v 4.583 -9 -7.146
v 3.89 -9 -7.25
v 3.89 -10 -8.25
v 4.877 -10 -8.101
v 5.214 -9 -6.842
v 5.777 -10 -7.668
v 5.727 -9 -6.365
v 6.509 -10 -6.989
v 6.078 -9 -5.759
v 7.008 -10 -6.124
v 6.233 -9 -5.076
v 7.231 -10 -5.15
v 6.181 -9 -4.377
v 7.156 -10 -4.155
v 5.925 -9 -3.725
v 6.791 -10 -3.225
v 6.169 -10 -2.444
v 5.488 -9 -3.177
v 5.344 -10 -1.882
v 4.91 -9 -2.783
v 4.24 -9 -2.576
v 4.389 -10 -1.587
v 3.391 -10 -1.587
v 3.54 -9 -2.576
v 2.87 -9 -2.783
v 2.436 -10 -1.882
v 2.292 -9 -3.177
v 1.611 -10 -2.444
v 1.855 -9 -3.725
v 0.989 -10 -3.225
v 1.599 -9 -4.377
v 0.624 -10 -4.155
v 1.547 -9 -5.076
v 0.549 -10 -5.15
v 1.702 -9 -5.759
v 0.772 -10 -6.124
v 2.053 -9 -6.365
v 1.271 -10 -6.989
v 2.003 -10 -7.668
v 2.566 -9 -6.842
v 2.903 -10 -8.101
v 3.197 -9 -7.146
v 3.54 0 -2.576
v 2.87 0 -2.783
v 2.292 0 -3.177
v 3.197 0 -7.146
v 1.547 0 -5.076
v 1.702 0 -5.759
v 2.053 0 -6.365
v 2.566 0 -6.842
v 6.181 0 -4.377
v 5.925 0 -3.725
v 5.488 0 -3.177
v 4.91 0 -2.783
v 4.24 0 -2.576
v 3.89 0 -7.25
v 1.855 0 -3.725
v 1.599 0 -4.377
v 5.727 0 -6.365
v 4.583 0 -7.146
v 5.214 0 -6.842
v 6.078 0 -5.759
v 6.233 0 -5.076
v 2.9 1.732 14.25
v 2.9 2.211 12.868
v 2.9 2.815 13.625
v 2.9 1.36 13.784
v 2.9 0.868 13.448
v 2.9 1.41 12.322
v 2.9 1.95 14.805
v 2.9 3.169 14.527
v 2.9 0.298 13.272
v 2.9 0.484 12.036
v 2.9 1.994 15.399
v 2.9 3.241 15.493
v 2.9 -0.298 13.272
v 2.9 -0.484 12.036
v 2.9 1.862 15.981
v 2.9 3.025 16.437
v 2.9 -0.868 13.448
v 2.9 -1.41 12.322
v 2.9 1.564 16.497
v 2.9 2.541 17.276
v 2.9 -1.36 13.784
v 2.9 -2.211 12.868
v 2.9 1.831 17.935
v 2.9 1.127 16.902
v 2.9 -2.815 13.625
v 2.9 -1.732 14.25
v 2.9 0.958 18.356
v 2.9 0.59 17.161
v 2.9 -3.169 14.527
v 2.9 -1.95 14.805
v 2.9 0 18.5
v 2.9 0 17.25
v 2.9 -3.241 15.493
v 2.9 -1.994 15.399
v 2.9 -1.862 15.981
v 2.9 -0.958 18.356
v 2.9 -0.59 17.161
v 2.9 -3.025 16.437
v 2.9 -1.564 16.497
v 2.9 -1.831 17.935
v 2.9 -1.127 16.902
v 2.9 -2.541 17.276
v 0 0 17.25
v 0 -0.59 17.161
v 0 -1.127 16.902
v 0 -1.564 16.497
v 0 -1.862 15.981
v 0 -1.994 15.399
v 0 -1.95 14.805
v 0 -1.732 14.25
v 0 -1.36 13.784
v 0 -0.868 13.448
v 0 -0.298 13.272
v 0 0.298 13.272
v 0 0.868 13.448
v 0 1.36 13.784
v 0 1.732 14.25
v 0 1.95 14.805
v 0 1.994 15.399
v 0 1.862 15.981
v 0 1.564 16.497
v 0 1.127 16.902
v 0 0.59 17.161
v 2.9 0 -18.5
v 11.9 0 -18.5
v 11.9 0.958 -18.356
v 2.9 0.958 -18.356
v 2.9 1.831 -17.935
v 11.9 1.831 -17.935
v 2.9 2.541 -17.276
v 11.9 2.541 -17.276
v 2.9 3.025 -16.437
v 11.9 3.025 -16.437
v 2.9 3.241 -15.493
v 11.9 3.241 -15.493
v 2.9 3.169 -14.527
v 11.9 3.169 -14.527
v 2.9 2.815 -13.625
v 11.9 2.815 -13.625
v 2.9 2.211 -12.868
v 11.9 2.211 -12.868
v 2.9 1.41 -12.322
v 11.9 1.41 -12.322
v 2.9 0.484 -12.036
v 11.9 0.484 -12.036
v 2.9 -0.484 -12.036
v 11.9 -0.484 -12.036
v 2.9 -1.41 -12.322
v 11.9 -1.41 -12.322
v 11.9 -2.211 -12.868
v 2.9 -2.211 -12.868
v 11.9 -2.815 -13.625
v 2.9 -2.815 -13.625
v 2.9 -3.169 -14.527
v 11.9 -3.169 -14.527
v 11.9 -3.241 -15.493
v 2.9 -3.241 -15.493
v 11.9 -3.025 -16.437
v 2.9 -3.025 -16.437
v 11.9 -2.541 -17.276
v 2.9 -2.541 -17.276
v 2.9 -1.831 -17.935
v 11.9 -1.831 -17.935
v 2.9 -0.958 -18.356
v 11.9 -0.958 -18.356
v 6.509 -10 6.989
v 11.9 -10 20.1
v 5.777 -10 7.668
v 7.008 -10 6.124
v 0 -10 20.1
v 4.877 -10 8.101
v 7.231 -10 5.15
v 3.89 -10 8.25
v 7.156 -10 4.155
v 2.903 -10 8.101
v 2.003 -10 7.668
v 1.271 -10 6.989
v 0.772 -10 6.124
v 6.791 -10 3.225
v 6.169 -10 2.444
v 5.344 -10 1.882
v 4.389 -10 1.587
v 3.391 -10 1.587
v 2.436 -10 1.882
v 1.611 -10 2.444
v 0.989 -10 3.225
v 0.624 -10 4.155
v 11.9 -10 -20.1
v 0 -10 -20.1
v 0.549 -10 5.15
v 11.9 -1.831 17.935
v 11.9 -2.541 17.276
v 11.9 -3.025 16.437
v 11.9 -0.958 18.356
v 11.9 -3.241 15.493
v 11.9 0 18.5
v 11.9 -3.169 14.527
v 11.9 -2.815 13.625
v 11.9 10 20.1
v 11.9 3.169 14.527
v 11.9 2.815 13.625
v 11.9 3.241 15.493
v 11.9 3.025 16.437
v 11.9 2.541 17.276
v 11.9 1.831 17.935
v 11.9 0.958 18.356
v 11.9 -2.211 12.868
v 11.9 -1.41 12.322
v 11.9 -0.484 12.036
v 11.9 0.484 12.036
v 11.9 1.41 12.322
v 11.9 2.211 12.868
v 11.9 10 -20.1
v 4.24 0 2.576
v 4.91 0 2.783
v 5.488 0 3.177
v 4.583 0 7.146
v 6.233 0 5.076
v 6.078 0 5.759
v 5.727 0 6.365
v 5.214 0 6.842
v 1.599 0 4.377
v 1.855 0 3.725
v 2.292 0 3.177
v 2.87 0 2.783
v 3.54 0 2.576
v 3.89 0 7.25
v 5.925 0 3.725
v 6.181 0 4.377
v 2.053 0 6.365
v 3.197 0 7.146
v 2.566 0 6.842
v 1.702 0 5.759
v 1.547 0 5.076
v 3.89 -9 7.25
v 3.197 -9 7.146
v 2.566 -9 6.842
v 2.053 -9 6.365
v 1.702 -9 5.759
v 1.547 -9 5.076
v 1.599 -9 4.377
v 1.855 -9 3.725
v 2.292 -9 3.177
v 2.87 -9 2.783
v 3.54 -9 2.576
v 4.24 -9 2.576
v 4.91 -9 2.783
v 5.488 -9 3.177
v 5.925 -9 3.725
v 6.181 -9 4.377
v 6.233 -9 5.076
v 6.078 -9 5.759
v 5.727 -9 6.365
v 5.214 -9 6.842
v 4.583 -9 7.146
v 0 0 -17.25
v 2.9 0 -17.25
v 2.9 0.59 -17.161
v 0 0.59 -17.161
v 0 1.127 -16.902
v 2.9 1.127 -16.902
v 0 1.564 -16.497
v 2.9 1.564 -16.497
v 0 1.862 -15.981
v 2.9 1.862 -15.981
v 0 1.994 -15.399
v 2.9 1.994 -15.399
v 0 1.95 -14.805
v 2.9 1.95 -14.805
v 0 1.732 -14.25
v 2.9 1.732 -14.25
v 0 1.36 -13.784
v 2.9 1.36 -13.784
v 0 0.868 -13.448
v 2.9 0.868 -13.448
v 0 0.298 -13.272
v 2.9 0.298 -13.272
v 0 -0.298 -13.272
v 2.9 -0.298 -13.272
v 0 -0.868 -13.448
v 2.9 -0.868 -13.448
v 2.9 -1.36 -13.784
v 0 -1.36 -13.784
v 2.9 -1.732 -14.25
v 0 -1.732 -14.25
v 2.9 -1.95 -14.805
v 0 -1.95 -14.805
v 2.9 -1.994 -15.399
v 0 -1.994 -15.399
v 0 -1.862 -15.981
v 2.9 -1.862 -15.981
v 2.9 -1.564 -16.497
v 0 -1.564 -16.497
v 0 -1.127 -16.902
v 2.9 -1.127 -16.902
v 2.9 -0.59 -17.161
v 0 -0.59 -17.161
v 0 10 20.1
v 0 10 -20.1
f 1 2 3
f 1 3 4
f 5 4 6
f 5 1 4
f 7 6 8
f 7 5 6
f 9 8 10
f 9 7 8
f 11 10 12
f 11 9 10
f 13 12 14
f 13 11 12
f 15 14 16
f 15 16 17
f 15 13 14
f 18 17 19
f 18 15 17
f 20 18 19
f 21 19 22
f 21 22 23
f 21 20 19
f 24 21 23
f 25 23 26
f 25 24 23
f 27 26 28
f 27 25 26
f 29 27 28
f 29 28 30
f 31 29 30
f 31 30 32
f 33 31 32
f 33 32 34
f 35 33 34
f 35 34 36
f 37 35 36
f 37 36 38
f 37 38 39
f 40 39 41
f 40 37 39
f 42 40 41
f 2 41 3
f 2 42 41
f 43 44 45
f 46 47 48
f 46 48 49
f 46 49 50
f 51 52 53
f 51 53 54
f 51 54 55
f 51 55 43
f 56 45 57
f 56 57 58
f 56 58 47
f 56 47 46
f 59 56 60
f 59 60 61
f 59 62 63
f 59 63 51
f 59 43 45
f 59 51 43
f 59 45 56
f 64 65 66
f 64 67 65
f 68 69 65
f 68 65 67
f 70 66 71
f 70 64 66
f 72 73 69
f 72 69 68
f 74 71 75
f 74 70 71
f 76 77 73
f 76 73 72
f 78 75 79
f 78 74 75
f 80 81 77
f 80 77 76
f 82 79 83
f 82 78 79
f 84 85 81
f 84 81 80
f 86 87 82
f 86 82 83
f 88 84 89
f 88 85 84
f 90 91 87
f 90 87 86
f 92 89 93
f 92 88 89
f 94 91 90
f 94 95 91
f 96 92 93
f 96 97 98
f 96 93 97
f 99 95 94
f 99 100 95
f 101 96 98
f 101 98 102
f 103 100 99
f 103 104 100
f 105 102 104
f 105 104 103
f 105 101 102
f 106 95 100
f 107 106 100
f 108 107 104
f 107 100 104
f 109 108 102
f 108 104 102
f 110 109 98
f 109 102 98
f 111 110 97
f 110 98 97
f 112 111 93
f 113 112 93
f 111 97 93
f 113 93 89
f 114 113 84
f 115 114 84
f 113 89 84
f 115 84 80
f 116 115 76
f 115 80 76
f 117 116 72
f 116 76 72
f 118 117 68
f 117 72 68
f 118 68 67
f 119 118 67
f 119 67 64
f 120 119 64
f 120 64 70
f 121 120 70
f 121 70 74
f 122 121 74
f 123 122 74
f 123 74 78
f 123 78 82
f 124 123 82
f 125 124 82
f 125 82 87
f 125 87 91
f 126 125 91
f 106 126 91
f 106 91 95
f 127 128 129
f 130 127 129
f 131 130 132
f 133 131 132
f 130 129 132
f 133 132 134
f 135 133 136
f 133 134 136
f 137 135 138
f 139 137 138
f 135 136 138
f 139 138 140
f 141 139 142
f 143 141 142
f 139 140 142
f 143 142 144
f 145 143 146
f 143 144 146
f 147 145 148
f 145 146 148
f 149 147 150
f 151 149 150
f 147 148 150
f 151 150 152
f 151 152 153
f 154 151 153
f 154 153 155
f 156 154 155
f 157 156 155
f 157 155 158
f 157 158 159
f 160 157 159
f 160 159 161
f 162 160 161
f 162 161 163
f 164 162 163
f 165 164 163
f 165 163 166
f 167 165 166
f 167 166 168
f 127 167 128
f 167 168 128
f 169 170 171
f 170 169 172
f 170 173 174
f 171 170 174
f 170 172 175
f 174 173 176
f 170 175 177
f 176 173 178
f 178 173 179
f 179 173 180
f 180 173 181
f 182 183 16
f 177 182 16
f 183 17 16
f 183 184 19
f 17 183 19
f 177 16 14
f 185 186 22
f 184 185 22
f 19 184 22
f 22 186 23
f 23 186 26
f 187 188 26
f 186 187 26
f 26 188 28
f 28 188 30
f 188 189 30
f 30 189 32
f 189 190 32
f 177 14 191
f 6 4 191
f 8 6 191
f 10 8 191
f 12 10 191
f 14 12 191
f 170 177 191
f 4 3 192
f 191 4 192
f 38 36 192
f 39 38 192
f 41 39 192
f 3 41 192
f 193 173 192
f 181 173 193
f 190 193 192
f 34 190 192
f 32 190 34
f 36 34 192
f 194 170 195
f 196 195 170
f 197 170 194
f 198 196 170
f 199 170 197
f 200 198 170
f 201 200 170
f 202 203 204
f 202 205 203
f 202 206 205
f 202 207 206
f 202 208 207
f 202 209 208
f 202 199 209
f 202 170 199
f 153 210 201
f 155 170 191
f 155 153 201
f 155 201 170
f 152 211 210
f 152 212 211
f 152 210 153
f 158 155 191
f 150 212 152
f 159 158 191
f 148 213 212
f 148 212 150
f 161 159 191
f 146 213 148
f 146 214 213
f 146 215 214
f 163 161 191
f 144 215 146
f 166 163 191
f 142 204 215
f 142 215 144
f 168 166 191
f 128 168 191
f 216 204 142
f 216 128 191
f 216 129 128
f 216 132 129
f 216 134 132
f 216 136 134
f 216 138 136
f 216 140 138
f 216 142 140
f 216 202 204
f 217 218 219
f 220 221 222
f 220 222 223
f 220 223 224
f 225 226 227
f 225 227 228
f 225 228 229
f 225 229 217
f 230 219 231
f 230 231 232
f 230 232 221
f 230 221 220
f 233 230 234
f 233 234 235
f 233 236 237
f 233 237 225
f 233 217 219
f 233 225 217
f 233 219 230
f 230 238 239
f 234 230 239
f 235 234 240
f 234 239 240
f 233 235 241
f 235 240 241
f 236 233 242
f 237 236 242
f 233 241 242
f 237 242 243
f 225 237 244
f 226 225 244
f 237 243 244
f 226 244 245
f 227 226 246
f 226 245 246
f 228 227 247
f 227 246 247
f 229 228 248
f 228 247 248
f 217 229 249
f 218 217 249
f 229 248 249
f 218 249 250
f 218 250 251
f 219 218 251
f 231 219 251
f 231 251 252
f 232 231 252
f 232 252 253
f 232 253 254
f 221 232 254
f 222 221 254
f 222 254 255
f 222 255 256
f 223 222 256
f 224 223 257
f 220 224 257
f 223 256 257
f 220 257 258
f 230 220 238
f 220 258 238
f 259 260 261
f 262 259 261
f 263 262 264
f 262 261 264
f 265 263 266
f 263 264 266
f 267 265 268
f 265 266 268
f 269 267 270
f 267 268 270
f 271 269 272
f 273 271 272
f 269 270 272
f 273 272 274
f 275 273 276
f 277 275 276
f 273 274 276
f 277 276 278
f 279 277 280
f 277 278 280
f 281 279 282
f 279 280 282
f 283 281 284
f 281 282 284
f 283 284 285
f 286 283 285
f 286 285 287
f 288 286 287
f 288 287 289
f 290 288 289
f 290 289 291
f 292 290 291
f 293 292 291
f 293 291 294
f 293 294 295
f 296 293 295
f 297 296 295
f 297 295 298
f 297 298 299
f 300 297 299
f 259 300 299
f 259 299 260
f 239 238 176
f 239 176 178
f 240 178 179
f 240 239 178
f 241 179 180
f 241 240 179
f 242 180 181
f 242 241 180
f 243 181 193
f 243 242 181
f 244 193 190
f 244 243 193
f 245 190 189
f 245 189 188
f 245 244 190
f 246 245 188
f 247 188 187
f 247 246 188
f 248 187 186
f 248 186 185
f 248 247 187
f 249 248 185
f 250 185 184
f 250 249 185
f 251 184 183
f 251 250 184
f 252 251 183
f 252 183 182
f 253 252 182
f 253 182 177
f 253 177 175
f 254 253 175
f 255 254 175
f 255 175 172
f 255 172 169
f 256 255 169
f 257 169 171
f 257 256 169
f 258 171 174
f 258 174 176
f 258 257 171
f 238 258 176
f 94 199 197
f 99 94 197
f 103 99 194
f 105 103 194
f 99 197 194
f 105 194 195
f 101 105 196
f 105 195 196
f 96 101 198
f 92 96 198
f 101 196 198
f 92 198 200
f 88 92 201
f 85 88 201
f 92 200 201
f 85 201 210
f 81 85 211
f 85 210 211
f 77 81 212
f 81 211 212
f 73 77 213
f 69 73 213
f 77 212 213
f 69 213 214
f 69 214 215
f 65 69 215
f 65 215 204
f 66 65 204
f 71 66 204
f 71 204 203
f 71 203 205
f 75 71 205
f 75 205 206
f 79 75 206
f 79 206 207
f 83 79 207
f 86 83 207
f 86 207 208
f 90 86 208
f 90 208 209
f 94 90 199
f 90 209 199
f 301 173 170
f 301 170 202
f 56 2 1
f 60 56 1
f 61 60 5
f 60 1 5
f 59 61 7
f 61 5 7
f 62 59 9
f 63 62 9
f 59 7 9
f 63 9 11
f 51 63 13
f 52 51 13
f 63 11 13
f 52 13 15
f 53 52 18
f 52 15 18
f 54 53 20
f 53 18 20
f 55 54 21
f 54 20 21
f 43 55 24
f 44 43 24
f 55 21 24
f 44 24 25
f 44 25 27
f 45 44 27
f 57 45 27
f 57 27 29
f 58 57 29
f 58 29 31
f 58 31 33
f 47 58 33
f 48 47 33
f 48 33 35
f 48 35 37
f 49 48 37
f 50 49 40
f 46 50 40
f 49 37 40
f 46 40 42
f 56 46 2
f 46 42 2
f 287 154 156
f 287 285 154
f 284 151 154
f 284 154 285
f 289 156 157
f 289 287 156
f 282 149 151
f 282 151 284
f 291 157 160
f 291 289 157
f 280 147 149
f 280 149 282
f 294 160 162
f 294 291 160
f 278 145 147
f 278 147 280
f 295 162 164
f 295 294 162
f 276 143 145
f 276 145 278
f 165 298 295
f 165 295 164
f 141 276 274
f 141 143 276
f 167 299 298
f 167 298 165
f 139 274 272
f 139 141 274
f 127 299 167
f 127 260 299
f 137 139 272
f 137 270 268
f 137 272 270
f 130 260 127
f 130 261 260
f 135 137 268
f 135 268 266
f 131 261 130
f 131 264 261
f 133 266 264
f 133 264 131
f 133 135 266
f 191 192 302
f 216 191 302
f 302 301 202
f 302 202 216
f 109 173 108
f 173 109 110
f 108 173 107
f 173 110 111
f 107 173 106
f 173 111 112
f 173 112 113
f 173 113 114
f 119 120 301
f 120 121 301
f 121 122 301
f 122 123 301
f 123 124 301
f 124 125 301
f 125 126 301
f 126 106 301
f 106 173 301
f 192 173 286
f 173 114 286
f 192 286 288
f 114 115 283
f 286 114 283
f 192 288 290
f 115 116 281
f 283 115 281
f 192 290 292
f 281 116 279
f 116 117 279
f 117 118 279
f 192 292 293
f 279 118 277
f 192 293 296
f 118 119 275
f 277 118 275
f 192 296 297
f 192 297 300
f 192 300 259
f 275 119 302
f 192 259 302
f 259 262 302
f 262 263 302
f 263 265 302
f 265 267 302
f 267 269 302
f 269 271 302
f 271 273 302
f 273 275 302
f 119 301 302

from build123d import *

# Parameters (mm, degrees)
SKETCH1_W           = 40.2
SKETCH1_H           = 20
BOSS_EXTRUDE1_DEPTH = 11.9
SKETCH2_R           = 2.35
CUT_EXTRUDE1_DEPTH  = 10
SKETCH3_R           = 2
CUT_EXTRUDE3_DEPTH  = 26.409053505
SKETCH5_R           = 3.25
CUT_EXTRUDE4_DEPTH  = 9
CHAMFER1_SIZE       = 1


with BuildPart() as part:
    # Sketch1 → Boss-Extrude1 (new body)
    with BuildSketch(Plane(origin=(0, 0, 0), x_dir=(0, 0, -1), z_dir=(1, 0, 0))):
        Rectangle(SKETCH1_W, SKETCH1_H)
    extrude(amount=BOSS_EXTRUDE1_DEPTH)

    # Sketch2 → Cut-Extrude1 (cut)
    with BuildSketch(Plane.XZ.offset(10)):
        with Locations(Location((3.89, -4.9, 0), (0, 0, 270))):
            Circle(SKETCH2_R)
        with Locations(Location((3.89, 4.9, 0), (0, 0, 90))):
            Circle(SKETCH2_R)
    extrude(amount=-CUT_EXTRUDE1_DEPTH, mode=Mode.SUBTRACT)

    # Sketch3 → Cut-Extrude3 (cut, through all)
    with BuildSketch(Plane(origin=(11.9, 0, 0), x_dir=(0, 0, -1), z_dir=(1, 0, 0))):
        with Locations((15.25, 0)):
            Circle(SKETCH3_R)
        with Locations(Location((-15.25, 0, 0), (0, 0, 180))):
            Circle(SKETCH3_R)
    extrude(amount=-CUT_EXTRUDE3_DEPTH, mode=Mode.SUBTRACT)

    # Sketch5 → Cut-Extrude4 (cut)
    with BuildSketch(Plane(origin=(11.9, 0, 0), x_dir=(0, 0, -1), z_dir=(1, 0, 0))):
        with Locations((15.25, 0)):
            Circle(SKETCH5_R)
        with Locations(Location((-15.25, 0, 0), (0, 0, 180))):
            Circle(SKETCH5_R)
    extrude(amount=-CUT_EXTRUDE4_DEPTH, mode=Mode.SUBTRACT)

    # Chamfer1
    chamfer1_edges = [part.edges().sort_by_distance(p)[0] for p in [
        (3.89, -10, -2.55),
        (3.89, -10, 2.55),
    ]]
    chamfer(chamfer1_edges, length=CHAMFER1_SIZE)


solid = part.part
